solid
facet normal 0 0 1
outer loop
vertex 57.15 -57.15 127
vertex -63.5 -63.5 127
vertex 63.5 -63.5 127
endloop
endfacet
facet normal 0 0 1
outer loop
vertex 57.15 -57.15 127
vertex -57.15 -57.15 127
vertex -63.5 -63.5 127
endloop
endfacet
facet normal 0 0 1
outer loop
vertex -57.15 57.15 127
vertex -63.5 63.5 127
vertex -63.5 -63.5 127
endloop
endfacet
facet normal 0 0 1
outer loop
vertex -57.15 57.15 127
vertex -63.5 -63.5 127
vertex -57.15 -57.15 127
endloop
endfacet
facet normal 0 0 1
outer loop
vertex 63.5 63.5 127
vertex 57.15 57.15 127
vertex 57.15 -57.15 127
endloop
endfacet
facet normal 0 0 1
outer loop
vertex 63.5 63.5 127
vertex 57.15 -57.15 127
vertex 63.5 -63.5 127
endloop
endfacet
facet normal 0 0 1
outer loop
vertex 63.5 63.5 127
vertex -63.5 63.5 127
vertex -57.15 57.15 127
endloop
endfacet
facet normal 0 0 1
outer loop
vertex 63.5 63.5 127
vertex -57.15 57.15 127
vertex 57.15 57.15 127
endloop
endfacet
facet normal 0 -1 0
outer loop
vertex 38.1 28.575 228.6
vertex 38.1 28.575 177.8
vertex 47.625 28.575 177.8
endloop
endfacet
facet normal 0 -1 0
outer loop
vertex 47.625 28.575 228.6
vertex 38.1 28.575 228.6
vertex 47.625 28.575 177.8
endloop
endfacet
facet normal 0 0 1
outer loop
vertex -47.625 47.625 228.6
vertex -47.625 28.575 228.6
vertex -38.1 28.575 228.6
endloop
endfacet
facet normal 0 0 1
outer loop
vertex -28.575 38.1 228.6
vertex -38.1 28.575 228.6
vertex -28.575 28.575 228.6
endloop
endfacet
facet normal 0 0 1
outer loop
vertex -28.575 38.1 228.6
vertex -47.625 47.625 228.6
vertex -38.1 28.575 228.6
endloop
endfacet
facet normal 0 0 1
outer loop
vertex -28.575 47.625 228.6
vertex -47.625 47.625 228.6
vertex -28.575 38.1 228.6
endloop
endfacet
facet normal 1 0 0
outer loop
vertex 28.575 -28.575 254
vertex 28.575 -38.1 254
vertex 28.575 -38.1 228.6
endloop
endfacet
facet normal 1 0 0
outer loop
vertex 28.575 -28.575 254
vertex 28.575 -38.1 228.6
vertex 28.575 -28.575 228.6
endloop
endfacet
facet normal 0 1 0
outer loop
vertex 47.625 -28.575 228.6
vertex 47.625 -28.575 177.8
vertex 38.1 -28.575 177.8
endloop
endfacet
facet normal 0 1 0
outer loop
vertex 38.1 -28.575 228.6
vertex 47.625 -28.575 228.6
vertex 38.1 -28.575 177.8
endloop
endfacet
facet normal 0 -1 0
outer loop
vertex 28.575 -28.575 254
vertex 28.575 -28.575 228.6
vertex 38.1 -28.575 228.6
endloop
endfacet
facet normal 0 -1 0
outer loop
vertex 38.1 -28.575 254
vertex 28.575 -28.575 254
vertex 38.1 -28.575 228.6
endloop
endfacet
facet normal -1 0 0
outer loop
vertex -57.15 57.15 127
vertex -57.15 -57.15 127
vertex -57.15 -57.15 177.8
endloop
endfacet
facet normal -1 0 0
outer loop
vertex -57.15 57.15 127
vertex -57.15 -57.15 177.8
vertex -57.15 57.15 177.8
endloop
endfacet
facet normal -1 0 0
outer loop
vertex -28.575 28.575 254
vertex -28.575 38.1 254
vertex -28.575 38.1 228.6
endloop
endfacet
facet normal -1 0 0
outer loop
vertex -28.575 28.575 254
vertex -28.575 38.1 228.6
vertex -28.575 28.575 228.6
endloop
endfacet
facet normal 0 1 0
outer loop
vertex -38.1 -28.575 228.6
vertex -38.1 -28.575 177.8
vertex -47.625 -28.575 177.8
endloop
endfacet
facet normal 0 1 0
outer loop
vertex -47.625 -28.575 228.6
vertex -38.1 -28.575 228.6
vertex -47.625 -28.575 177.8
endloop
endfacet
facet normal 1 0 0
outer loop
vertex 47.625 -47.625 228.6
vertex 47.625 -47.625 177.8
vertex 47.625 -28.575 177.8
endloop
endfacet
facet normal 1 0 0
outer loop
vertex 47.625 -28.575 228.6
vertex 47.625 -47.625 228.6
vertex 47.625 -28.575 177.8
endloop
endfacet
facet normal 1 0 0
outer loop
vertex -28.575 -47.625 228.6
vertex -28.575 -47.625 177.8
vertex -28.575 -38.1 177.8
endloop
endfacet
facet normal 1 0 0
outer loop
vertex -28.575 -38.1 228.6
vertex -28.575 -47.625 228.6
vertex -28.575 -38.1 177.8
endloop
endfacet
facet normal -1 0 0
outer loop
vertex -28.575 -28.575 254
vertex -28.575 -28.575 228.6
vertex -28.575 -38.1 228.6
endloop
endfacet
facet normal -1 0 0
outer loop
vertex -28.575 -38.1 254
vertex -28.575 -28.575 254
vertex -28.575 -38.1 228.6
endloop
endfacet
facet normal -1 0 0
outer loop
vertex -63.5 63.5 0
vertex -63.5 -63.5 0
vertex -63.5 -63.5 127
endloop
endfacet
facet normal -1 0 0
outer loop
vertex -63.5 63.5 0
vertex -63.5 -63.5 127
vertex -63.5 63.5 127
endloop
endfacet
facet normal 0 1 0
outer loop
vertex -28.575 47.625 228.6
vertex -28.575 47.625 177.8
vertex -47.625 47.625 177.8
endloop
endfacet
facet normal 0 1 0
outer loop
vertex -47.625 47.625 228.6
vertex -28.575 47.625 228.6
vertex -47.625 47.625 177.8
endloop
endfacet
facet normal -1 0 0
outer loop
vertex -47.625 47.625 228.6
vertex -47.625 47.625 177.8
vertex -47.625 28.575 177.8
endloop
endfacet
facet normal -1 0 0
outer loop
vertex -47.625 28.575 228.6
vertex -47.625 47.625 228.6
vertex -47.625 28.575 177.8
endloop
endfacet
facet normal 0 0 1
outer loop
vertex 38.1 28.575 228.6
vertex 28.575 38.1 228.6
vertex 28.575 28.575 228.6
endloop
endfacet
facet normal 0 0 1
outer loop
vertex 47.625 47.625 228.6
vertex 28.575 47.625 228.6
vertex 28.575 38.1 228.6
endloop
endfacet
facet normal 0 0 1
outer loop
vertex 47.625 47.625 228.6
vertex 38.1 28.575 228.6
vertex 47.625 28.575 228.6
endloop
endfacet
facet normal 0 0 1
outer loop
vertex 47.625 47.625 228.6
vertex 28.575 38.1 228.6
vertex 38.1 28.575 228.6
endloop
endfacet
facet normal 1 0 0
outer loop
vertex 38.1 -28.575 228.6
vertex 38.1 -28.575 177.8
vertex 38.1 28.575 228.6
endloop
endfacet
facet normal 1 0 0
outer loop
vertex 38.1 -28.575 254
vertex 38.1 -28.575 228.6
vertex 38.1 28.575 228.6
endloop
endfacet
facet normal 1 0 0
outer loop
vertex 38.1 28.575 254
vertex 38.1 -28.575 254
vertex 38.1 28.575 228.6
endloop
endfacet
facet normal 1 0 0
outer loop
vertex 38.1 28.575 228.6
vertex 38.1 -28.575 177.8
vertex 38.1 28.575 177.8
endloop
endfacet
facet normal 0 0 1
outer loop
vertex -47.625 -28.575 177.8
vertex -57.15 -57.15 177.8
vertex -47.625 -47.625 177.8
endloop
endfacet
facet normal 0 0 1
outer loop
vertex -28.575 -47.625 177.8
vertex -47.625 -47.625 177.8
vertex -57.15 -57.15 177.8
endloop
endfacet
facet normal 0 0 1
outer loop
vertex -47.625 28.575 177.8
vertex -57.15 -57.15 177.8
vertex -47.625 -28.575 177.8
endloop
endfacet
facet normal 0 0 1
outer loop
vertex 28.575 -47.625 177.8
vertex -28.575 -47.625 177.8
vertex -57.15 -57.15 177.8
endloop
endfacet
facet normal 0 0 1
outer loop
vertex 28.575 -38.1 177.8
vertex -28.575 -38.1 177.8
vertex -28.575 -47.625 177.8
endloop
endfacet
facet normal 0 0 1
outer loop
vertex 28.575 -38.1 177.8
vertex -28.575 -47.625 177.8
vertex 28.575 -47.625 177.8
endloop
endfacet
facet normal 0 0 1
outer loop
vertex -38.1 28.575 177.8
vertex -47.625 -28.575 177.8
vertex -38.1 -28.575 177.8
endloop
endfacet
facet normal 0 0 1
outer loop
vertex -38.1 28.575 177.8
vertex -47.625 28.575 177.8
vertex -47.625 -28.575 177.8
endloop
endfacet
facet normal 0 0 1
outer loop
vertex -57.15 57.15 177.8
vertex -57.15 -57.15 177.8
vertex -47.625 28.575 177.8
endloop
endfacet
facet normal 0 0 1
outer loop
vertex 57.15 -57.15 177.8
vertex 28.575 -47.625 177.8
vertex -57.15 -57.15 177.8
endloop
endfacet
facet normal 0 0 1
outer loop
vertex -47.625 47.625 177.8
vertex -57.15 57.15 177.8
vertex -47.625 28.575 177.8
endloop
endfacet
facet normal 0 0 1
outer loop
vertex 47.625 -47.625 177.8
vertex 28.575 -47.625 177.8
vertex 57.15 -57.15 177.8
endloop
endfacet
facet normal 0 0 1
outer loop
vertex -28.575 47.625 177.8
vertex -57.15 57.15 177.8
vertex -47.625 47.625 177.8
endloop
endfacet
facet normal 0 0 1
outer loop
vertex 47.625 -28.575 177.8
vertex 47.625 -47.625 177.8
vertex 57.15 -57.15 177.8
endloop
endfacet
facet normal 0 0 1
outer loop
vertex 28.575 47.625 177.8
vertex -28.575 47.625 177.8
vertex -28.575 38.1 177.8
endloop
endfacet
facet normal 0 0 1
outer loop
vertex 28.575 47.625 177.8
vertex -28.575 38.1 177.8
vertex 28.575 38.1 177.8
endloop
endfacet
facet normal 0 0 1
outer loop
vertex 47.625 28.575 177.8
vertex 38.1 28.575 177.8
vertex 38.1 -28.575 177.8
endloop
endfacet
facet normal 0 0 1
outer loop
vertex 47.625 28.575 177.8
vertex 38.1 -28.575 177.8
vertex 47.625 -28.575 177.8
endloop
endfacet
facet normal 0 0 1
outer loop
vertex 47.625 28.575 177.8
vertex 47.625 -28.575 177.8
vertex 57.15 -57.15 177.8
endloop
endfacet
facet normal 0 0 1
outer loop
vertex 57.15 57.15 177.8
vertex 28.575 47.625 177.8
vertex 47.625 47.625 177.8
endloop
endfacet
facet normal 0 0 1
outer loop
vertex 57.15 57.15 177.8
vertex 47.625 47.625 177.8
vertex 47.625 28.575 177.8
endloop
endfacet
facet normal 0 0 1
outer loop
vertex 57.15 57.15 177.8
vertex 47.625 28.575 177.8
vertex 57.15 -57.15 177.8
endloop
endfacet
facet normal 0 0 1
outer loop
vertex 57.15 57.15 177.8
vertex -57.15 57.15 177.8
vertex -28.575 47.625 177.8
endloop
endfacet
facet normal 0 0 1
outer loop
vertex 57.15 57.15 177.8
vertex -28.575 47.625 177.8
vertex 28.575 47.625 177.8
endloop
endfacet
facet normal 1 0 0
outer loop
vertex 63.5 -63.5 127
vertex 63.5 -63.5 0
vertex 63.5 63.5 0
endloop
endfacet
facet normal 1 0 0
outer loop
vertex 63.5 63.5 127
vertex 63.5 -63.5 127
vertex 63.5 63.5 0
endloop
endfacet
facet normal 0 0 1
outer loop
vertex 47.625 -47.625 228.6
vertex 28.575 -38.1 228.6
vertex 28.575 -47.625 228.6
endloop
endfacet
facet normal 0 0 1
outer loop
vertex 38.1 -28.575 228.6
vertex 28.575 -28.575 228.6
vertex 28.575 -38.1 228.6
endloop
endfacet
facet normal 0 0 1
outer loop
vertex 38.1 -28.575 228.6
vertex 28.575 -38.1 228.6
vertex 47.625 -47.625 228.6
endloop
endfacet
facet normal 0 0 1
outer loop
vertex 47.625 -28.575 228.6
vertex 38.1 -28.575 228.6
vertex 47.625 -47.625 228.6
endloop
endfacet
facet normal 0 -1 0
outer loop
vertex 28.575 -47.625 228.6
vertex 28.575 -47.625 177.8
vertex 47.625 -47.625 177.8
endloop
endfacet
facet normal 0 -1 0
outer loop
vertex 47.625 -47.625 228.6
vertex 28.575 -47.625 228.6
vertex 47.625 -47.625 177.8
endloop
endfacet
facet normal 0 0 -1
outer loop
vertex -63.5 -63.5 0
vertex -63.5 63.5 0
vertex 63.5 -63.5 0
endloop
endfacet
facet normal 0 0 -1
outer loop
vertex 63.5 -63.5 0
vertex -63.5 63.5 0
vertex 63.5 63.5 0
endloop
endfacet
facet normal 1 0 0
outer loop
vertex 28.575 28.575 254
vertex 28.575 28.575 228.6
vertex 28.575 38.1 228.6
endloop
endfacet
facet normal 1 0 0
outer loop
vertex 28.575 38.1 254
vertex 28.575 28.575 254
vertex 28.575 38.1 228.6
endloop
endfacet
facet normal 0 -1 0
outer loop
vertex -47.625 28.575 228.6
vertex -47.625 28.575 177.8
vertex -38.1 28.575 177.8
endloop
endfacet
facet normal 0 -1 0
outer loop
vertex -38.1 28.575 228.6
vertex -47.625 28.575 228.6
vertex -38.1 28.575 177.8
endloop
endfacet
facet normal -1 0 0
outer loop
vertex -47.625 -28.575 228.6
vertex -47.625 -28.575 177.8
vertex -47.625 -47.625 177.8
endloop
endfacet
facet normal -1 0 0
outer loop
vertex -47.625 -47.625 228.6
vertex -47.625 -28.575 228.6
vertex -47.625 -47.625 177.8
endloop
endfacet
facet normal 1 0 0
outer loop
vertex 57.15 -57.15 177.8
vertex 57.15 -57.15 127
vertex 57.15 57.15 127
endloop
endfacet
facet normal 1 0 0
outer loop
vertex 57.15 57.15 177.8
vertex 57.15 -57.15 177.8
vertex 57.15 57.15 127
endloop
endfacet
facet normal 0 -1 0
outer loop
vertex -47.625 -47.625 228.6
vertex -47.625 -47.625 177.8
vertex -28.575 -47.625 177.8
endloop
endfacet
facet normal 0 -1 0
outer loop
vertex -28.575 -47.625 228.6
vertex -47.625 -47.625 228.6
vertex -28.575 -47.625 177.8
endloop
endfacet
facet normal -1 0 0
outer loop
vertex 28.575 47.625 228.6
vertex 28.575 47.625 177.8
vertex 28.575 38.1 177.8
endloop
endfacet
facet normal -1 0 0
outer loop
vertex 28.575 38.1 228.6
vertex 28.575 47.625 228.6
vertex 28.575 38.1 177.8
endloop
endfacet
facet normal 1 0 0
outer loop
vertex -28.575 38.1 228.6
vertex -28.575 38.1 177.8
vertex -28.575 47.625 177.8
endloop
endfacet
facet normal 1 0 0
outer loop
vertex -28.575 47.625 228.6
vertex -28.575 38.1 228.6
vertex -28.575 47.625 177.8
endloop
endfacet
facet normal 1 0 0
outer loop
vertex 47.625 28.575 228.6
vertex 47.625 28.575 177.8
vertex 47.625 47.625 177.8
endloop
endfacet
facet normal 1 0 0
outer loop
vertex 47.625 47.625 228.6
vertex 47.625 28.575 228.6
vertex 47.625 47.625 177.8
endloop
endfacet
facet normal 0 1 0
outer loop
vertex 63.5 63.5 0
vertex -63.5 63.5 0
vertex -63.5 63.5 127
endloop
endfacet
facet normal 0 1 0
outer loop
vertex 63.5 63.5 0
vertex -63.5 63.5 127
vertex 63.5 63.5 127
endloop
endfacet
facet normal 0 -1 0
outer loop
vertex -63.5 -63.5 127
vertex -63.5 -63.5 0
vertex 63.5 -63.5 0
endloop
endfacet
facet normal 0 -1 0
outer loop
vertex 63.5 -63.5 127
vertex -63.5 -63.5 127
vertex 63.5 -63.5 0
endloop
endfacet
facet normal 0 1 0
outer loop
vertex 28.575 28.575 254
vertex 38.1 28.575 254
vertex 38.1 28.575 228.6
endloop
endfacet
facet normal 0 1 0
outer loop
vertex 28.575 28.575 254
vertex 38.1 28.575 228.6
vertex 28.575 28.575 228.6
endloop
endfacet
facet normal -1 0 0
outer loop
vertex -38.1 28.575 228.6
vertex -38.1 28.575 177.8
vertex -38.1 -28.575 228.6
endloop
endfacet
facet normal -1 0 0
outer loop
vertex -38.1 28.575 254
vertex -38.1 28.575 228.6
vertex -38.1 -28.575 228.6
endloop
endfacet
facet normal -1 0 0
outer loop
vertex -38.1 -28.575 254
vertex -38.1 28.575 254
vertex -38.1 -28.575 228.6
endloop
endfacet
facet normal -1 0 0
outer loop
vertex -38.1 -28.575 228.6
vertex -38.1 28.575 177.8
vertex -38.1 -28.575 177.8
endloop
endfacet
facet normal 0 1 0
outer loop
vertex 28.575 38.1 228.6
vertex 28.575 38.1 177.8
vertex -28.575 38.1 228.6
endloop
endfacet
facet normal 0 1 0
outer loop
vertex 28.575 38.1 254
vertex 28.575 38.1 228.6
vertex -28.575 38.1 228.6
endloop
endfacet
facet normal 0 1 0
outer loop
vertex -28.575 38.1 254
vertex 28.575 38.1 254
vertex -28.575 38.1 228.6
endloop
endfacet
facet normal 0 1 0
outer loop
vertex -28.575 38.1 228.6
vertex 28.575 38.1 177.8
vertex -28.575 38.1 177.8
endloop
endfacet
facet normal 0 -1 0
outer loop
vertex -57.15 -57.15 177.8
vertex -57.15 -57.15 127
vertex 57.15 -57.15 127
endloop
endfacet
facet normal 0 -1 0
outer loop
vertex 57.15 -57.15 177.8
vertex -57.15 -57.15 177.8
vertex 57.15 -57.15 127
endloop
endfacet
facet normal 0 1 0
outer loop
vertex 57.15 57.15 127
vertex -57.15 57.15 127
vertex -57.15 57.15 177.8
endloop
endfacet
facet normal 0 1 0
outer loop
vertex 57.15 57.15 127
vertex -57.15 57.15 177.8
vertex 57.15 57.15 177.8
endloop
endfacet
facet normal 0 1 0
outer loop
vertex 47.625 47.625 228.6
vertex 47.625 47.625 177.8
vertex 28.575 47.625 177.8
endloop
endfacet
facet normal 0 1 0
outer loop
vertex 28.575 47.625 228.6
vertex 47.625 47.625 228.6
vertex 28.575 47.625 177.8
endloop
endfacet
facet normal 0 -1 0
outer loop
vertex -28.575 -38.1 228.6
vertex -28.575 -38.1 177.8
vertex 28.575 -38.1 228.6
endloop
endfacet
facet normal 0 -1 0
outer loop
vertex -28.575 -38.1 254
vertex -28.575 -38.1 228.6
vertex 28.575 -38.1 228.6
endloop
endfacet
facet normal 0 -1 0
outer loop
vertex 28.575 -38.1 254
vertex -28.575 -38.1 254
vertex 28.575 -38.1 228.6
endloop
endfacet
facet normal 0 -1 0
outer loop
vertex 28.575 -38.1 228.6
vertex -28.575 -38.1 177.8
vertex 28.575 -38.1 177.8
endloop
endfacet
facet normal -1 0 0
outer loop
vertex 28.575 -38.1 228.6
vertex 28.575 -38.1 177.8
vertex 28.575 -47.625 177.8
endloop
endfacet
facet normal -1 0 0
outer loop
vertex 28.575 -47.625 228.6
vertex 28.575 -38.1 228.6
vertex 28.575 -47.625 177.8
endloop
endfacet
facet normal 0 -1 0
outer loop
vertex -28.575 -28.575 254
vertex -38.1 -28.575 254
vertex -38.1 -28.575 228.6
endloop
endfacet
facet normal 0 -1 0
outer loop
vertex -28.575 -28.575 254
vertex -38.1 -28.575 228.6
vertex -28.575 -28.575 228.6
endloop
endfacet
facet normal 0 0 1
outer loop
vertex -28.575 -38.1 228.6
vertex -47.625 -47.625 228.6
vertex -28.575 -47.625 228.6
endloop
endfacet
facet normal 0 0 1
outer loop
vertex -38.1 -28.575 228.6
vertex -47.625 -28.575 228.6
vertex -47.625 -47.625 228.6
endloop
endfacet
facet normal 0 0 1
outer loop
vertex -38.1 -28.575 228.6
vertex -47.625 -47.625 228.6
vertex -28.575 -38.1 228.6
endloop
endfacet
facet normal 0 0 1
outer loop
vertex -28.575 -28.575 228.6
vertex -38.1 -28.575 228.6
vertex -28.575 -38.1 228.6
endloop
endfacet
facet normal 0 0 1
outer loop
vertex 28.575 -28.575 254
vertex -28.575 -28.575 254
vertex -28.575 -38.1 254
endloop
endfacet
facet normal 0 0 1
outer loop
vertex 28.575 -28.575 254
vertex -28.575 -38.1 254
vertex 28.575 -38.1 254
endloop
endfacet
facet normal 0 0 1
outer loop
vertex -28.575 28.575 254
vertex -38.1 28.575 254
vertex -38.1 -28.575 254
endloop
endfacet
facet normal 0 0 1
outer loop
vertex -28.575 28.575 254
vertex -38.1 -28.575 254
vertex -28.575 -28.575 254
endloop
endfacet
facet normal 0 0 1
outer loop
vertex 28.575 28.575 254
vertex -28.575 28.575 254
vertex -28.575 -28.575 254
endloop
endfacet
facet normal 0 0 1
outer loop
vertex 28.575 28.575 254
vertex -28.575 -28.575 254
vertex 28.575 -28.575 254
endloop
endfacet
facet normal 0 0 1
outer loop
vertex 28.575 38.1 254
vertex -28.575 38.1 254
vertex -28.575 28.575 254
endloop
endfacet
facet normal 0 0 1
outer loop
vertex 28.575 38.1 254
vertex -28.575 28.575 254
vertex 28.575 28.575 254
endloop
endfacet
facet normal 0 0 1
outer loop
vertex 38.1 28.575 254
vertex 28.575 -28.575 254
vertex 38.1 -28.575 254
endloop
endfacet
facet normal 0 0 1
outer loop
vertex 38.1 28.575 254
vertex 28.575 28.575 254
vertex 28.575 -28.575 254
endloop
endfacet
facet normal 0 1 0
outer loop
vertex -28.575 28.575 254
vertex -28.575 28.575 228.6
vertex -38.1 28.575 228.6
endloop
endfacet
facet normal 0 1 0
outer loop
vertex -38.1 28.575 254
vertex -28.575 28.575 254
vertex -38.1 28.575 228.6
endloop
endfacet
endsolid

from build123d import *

# Parameters (mm, degrees)
F1_DEPTH = 254
F0_W     = 9.525
F0_H     = 9.525
F2_DEPTH = 228.6
F0_W_2   = 114.3
F0_H_2   = 114.3
F3_DEPTH = 177.8
F0_W_3   = 127
F0_H_3   = 127
F4_DEPTH = 127


with BuildPart() as f1:
    # F0 (on Top) → F1 (new body)
    with BuildSketch(Plane.XY):
        Polygon((28.575, 38.1), (-28.575, 38.1), (-28.575, 28.575), (-38.1, 28.575), (-38.1, -28.575), (-28.575, -28.575), (-28.575, -38.1), (28.575, -38.1), (28.575, -28.575), (38.1, -28.575), (38.1, 28.575), (28.575, 28.575), align=None)
    extrude(amount=F1_DEPTH)

    # F0 (on Top) → F2 (join)
    with BuildSketch(Plane.XY):
        Polygon((-38.1, 28.575), (-38.1, 38.1), (-28.575, 38.1), (-28.575, 47.625), (-47.625, 47.625), (-47.625, 28.575), align=None)
        with Locations((-33.3375, 33.3375)):
            Rectangle(F0_W, F0_H)
        Polygon((-38.1, -38.1), (-38.1, -28.575), (-47.625, -28.575), (-47.625, -47.625), (-28.575, -47.625), (-28.575, -38.1), align=None)
        with Locations((-33.3375, -33.3375)):
            Rectangle(F0_W, F0_H)
        Polygon((47.625, -28.575), (38.1, -28.575), (38.1, -38.1), (28.575, -38.1), (28.575, -47.625), (47.625, -47.625), align=None)
        with Locations((33.3375, -33.3375)):
            Rectangle(F0_W, F0_H)
        Polygon((28.575, 47.625), (28.575, 38.1), (38.1, 38.1), (38.1, 28.575), (47.625, 28.575), (47.625, 47.625), align=None)
        with Locations((33.3375, 33.3375)):
            Rectangle(F0_W, F0_H)
    extrude(amount=F2_DEPTH)

    # F0 (on Top) → F3 (join)
    with BuildSketch(Plane.XY):
        Rectangle(F0_W_2, F0_H_2)
        Polygon((-28.575, 47.625), (-28.575, 38.1), (28.575, 38.1), (28.575, 47.625), (47.625, 47.625), (47.625, 28.575), (38.1, 28.575), (38.1, -28.575), (47.625, -28.575), (47.625, -47.625), (28.575, -47.625), (28.575, -38.1), (-28.575, -38.1), (-28.575, -47.625), (-47.625, -47.625), (-47.625, -28.575), (-38.1, -28.575), (-38.1, 28.575), (-47.625, 28.575), (-47.625, 47.625), align=None, mode=Mode.SUBTRACT)
    extrude(amount=F3_DEPTH)

    # F0 (on Top) → F4 (join)
    with BuildSketch(Plane.XY):
        Rectangle(F0_W_3, F0_H_3)
        Rectangle(F0_W_2, F0_H_2, mode=Mode.SUBTRACT)
    extrude(amount=F4_DEPTH)


solid = f1.part
